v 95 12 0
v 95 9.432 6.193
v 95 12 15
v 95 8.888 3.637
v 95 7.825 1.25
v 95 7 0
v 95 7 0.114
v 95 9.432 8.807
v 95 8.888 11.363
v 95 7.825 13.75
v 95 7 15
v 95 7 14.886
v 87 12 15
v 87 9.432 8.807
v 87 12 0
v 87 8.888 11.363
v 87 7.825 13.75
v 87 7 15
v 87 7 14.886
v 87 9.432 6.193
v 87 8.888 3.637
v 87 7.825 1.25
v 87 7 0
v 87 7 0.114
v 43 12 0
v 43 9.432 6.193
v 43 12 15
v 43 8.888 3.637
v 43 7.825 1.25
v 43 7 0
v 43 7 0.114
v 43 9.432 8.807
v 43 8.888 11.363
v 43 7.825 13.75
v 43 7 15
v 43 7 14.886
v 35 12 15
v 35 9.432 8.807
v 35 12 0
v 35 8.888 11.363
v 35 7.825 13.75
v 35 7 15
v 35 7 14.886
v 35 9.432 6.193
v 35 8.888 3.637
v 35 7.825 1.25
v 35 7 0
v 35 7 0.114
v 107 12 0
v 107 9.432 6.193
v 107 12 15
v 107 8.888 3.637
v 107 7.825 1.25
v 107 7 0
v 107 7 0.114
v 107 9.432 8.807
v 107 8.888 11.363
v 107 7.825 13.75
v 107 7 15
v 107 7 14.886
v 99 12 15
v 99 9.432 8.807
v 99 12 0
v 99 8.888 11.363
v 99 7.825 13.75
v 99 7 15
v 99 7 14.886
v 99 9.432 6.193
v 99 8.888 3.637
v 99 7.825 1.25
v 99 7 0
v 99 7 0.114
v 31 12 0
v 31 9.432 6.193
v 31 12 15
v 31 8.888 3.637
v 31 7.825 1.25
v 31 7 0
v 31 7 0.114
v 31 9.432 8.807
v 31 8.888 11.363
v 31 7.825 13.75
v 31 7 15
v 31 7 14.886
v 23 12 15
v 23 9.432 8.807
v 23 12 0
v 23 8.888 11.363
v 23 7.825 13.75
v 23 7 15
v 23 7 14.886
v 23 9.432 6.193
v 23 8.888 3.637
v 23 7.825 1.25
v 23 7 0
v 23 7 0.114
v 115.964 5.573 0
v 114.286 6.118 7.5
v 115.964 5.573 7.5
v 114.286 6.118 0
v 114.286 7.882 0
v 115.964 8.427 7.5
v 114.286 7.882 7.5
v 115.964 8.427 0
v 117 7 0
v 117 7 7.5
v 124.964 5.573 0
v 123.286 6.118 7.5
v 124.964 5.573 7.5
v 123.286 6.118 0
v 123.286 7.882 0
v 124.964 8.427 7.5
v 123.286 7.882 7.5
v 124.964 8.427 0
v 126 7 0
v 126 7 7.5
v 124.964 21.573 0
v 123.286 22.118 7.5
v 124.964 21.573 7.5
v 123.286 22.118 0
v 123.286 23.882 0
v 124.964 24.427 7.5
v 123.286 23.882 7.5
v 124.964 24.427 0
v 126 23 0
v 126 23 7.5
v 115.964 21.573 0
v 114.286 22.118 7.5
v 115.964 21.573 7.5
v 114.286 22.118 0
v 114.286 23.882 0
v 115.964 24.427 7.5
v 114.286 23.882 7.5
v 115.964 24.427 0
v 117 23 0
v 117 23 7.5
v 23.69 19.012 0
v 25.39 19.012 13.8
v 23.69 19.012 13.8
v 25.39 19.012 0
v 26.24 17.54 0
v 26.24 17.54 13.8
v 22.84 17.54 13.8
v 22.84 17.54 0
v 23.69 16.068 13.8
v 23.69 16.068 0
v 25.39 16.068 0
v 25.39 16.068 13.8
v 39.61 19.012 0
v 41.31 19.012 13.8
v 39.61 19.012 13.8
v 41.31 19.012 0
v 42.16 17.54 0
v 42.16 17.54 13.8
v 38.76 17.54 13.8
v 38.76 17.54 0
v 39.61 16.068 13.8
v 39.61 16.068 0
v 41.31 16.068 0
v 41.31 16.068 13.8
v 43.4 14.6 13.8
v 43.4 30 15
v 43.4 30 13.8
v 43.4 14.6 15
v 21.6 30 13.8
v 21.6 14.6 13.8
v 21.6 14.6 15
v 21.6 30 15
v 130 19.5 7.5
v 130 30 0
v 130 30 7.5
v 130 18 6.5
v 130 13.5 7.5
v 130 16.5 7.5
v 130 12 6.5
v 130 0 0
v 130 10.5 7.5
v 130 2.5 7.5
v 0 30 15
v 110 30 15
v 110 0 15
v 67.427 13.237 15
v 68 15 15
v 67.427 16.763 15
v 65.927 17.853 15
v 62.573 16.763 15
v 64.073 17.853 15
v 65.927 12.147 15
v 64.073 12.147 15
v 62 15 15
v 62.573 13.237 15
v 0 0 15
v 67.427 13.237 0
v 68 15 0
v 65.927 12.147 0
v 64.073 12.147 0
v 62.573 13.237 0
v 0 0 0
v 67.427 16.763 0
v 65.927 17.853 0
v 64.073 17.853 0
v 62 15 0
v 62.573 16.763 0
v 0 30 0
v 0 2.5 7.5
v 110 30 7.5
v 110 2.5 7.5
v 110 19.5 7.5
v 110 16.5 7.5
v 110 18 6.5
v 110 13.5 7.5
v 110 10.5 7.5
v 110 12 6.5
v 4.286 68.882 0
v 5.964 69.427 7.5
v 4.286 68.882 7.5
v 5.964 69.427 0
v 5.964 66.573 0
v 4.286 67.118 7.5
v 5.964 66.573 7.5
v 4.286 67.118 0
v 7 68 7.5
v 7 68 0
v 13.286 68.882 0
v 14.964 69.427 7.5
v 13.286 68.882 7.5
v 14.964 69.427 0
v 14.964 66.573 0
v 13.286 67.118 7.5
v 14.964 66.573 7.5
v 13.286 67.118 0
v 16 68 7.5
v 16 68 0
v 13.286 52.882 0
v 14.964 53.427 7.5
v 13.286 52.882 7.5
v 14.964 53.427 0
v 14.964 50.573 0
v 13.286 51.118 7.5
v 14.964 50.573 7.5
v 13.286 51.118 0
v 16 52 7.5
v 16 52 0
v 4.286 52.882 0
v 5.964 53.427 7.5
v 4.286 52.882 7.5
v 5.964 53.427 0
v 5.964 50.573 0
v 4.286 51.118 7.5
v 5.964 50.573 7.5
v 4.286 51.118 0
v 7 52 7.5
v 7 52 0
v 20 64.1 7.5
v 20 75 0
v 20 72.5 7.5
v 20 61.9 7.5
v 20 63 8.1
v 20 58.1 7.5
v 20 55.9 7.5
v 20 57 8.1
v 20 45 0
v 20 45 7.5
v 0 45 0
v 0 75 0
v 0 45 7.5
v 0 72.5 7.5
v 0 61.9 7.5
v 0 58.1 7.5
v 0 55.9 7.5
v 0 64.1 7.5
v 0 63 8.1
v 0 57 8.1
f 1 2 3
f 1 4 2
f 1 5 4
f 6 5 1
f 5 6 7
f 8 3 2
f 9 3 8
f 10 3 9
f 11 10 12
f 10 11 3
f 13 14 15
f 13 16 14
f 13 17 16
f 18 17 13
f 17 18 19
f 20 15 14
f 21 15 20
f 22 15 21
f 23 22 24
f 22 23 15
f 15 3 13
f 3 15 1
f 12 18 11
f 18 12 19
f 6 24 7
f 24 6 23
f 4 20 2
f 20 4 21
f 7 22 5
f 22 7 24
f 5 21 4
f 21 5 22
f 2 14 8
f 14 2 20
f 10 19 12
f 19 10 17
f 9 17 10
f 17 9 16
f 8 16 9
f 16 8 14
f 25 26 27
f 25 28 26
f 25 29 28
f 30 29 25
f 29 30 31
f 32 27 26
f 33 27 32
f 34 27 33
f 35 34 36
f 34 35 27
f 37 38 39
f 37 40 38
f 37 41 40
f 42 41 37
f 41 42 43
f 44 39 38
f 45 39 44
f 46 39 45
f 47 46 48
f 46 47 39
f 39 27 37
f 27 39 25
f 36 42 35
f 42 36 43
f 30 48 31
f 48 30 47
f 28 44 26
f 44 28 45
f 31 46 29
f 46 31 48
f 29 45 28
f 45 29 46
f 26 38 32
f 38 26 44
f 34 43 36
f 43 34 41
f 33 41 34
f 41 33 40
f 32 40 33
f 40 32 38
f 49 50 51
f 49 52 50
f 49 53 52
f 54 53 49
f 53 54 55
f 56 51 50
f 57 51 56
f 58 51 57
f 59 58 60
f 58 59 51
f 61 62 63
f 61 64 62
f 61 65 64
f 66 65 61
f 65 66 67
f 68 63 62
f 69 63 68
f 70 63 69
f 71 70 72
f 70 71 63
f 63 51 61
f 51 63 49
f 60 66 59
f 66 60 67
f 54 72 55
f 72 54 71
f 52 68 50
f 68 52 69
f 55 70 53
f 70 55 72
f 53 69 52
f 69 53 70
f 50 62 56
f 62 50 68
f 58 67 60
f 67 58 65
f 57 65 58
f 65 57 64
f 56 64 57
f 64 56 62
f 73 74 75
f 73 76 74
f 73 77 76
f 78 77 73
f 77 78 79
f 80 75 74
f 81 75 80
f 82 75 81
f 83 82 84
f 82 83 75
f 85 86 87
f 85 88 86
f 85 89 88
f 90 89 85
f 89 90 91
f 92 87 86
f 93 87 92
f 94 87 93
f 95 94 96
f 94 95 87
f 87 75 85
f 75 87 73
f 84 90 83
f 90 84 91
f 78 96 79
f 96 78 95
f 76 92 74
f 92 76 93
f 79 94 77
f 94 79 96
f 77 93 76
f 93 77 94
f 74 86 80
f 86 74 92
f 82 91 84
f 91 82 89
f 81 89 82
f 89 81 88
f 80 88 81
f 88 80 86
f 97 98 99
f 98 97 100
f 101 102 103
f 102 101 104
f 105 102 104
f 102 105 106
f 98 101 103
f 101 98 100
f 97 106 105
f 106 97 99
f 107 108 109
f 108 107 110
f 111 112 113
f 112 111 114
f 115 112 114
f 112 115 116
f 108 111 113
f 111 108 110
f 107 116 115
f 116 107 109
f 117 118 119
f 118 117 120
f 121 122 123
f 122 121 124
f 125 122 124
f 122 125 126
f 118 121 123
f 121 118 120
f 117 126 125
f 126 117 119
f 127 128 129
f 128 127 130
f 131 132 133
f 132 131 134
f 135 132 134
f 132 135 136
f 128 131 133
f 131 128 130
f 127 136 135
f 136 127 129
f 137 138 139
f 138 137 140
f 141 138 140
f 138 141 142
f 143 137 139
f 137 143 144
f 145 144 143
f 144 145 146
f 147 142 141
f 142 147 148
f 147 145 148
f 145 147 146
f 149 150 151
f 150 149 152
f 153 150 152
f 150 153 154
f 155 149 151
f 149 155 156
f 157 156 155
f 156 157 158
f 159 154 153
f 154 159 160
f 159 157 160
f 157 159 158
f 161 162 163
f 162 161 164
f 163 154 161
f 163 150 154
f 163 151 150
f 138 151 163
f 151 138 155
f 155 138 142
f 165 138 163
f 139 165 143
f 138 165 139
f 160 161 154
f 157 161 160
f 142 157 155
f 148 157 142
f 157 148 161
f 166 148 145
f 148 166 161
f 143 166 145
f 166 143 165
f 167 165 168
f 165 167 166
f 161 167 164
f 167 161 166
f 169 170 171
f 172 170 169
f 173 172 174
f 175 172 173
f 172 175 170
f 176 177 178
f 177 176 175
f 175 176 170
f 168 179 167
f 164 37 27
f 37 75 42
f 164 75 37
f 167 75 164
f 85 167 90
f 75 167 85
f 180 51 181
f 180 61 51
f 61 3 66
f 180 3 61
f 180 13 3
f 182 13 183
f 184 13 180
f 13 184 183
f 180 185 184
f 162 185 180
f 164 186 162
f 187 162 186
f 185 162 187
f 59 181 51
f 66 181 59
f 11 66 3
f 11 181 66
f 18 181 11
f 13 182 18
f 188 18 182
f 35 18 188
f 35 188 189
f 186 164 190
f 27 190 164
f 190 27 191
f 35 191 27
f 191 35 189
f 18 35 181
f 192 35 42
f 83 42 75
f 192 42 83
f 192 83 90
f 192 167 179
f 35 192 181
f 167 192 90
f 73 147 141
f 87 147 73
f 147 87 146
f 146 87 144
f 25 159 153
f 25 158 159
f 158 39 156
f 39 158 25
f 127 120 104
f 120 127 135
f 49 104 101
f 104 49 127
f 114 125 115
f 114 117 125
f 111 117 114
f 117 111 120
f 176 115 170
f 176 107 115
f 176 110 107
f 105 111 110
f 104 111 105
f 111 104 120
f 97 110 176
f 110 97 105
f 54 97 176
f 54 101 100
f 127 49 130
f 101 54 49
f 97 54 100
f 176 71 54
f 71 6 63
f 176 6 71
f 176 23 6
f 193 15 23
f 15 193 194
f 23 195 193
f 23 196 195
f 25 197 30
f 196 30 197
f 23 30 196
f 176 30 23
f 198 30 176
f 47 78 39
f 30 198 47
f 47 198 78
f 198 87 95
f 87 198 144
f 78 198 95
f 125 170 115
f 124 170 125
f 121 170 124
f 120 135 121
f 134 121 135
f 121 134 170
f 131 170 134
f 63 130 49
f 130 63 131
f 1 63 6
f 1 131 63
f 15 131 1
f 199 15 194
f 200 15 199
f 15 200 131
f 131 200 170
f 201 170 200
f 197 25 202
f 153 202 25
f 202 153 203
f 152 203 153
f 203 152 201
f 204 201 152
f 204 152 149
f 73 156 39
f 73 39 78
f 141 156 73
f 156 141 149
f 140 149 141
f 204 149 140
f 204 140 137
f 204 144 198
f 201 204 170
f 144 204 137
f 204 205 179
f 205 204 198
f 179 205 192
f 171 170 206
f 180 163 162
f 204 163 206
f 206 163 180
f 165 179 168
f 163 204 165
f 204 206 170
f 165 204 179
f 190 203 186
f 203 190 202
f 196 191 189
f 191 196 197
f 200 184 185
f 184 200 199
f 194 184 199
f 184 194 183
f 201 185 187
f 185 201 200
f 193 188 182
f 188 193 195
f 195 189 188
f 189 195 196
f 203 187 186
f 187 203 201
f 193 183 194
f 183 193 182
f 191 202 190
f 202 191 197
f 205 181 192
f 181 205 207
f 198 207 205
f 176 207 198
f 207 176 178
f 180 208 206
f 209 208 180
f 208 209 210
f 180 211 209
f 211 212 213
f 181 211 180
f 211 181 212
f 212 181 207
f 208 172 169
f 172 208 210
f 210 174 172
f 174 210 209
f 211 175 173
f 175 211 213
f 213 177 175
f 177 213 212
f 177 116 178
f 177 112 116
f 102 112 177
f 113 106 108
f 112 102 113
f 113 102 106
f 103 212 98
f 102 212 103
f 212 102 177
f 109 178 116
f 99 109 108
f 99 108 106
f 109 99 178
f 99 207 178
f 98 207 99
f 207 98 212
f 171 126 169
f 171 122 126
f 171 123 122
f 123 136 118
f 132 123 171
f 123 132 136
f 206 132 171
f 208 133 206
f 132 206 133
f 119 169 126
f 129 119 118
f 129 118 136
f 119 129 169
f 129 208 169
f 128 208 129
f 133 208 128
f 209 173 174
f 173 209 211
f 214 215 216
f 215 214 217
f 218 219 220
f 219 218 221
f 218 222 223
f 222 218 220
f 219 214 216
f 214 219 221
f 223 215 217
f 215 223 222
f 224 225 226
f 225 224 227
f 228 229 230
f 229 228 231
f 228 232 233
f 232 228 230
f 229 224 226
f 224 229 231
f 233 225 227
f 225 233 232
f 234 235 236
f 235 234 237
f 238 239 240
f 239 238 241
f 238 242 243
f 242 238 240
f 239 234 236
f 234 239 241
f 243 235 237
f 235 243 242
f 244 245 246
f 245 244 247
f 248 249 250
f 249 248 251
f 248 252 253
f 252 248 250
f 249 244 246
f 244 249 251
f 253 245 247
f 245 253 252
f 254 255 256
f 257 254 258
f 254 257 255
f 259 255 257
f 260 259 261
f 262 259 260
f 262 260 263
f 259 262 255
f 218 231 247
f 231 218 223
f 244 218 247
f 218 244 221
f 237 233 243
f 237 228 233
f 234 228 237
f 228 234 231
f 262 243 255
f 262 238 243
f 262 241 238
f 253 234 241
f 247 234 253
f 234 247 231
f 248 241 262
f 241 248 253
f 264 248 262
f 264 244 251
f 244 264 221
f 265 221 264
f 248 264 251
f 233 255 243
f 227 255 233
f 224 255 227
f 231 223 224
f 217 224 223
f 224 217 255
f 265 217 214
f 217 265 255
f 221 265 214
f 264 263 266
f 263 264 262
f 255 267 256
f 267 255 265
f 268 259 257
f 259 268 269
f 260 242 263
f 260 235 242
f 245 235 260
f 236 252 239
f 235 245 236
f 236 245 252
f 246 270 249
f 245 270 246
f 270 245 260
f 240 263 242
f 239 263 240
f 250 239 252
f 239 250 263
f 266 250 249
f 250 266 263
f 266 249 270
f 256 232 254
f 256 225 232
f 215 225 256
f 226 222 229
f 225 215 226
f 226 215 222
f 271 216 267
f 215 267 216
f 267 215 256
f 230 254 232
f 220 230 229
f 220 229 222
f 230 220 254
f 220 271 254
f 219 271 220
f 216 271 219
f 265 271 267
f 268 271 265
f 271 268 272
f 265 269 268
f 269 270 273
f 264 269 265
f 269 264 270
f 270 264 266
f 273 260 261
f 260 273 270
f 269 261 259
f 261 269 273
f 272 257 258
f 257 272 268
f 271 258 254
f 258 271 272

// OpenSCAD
include <dumbstick.scad>
translate([65,0,0]) TIPPER_main();
translate([-45,45,0]) TIPPER_clamp();
